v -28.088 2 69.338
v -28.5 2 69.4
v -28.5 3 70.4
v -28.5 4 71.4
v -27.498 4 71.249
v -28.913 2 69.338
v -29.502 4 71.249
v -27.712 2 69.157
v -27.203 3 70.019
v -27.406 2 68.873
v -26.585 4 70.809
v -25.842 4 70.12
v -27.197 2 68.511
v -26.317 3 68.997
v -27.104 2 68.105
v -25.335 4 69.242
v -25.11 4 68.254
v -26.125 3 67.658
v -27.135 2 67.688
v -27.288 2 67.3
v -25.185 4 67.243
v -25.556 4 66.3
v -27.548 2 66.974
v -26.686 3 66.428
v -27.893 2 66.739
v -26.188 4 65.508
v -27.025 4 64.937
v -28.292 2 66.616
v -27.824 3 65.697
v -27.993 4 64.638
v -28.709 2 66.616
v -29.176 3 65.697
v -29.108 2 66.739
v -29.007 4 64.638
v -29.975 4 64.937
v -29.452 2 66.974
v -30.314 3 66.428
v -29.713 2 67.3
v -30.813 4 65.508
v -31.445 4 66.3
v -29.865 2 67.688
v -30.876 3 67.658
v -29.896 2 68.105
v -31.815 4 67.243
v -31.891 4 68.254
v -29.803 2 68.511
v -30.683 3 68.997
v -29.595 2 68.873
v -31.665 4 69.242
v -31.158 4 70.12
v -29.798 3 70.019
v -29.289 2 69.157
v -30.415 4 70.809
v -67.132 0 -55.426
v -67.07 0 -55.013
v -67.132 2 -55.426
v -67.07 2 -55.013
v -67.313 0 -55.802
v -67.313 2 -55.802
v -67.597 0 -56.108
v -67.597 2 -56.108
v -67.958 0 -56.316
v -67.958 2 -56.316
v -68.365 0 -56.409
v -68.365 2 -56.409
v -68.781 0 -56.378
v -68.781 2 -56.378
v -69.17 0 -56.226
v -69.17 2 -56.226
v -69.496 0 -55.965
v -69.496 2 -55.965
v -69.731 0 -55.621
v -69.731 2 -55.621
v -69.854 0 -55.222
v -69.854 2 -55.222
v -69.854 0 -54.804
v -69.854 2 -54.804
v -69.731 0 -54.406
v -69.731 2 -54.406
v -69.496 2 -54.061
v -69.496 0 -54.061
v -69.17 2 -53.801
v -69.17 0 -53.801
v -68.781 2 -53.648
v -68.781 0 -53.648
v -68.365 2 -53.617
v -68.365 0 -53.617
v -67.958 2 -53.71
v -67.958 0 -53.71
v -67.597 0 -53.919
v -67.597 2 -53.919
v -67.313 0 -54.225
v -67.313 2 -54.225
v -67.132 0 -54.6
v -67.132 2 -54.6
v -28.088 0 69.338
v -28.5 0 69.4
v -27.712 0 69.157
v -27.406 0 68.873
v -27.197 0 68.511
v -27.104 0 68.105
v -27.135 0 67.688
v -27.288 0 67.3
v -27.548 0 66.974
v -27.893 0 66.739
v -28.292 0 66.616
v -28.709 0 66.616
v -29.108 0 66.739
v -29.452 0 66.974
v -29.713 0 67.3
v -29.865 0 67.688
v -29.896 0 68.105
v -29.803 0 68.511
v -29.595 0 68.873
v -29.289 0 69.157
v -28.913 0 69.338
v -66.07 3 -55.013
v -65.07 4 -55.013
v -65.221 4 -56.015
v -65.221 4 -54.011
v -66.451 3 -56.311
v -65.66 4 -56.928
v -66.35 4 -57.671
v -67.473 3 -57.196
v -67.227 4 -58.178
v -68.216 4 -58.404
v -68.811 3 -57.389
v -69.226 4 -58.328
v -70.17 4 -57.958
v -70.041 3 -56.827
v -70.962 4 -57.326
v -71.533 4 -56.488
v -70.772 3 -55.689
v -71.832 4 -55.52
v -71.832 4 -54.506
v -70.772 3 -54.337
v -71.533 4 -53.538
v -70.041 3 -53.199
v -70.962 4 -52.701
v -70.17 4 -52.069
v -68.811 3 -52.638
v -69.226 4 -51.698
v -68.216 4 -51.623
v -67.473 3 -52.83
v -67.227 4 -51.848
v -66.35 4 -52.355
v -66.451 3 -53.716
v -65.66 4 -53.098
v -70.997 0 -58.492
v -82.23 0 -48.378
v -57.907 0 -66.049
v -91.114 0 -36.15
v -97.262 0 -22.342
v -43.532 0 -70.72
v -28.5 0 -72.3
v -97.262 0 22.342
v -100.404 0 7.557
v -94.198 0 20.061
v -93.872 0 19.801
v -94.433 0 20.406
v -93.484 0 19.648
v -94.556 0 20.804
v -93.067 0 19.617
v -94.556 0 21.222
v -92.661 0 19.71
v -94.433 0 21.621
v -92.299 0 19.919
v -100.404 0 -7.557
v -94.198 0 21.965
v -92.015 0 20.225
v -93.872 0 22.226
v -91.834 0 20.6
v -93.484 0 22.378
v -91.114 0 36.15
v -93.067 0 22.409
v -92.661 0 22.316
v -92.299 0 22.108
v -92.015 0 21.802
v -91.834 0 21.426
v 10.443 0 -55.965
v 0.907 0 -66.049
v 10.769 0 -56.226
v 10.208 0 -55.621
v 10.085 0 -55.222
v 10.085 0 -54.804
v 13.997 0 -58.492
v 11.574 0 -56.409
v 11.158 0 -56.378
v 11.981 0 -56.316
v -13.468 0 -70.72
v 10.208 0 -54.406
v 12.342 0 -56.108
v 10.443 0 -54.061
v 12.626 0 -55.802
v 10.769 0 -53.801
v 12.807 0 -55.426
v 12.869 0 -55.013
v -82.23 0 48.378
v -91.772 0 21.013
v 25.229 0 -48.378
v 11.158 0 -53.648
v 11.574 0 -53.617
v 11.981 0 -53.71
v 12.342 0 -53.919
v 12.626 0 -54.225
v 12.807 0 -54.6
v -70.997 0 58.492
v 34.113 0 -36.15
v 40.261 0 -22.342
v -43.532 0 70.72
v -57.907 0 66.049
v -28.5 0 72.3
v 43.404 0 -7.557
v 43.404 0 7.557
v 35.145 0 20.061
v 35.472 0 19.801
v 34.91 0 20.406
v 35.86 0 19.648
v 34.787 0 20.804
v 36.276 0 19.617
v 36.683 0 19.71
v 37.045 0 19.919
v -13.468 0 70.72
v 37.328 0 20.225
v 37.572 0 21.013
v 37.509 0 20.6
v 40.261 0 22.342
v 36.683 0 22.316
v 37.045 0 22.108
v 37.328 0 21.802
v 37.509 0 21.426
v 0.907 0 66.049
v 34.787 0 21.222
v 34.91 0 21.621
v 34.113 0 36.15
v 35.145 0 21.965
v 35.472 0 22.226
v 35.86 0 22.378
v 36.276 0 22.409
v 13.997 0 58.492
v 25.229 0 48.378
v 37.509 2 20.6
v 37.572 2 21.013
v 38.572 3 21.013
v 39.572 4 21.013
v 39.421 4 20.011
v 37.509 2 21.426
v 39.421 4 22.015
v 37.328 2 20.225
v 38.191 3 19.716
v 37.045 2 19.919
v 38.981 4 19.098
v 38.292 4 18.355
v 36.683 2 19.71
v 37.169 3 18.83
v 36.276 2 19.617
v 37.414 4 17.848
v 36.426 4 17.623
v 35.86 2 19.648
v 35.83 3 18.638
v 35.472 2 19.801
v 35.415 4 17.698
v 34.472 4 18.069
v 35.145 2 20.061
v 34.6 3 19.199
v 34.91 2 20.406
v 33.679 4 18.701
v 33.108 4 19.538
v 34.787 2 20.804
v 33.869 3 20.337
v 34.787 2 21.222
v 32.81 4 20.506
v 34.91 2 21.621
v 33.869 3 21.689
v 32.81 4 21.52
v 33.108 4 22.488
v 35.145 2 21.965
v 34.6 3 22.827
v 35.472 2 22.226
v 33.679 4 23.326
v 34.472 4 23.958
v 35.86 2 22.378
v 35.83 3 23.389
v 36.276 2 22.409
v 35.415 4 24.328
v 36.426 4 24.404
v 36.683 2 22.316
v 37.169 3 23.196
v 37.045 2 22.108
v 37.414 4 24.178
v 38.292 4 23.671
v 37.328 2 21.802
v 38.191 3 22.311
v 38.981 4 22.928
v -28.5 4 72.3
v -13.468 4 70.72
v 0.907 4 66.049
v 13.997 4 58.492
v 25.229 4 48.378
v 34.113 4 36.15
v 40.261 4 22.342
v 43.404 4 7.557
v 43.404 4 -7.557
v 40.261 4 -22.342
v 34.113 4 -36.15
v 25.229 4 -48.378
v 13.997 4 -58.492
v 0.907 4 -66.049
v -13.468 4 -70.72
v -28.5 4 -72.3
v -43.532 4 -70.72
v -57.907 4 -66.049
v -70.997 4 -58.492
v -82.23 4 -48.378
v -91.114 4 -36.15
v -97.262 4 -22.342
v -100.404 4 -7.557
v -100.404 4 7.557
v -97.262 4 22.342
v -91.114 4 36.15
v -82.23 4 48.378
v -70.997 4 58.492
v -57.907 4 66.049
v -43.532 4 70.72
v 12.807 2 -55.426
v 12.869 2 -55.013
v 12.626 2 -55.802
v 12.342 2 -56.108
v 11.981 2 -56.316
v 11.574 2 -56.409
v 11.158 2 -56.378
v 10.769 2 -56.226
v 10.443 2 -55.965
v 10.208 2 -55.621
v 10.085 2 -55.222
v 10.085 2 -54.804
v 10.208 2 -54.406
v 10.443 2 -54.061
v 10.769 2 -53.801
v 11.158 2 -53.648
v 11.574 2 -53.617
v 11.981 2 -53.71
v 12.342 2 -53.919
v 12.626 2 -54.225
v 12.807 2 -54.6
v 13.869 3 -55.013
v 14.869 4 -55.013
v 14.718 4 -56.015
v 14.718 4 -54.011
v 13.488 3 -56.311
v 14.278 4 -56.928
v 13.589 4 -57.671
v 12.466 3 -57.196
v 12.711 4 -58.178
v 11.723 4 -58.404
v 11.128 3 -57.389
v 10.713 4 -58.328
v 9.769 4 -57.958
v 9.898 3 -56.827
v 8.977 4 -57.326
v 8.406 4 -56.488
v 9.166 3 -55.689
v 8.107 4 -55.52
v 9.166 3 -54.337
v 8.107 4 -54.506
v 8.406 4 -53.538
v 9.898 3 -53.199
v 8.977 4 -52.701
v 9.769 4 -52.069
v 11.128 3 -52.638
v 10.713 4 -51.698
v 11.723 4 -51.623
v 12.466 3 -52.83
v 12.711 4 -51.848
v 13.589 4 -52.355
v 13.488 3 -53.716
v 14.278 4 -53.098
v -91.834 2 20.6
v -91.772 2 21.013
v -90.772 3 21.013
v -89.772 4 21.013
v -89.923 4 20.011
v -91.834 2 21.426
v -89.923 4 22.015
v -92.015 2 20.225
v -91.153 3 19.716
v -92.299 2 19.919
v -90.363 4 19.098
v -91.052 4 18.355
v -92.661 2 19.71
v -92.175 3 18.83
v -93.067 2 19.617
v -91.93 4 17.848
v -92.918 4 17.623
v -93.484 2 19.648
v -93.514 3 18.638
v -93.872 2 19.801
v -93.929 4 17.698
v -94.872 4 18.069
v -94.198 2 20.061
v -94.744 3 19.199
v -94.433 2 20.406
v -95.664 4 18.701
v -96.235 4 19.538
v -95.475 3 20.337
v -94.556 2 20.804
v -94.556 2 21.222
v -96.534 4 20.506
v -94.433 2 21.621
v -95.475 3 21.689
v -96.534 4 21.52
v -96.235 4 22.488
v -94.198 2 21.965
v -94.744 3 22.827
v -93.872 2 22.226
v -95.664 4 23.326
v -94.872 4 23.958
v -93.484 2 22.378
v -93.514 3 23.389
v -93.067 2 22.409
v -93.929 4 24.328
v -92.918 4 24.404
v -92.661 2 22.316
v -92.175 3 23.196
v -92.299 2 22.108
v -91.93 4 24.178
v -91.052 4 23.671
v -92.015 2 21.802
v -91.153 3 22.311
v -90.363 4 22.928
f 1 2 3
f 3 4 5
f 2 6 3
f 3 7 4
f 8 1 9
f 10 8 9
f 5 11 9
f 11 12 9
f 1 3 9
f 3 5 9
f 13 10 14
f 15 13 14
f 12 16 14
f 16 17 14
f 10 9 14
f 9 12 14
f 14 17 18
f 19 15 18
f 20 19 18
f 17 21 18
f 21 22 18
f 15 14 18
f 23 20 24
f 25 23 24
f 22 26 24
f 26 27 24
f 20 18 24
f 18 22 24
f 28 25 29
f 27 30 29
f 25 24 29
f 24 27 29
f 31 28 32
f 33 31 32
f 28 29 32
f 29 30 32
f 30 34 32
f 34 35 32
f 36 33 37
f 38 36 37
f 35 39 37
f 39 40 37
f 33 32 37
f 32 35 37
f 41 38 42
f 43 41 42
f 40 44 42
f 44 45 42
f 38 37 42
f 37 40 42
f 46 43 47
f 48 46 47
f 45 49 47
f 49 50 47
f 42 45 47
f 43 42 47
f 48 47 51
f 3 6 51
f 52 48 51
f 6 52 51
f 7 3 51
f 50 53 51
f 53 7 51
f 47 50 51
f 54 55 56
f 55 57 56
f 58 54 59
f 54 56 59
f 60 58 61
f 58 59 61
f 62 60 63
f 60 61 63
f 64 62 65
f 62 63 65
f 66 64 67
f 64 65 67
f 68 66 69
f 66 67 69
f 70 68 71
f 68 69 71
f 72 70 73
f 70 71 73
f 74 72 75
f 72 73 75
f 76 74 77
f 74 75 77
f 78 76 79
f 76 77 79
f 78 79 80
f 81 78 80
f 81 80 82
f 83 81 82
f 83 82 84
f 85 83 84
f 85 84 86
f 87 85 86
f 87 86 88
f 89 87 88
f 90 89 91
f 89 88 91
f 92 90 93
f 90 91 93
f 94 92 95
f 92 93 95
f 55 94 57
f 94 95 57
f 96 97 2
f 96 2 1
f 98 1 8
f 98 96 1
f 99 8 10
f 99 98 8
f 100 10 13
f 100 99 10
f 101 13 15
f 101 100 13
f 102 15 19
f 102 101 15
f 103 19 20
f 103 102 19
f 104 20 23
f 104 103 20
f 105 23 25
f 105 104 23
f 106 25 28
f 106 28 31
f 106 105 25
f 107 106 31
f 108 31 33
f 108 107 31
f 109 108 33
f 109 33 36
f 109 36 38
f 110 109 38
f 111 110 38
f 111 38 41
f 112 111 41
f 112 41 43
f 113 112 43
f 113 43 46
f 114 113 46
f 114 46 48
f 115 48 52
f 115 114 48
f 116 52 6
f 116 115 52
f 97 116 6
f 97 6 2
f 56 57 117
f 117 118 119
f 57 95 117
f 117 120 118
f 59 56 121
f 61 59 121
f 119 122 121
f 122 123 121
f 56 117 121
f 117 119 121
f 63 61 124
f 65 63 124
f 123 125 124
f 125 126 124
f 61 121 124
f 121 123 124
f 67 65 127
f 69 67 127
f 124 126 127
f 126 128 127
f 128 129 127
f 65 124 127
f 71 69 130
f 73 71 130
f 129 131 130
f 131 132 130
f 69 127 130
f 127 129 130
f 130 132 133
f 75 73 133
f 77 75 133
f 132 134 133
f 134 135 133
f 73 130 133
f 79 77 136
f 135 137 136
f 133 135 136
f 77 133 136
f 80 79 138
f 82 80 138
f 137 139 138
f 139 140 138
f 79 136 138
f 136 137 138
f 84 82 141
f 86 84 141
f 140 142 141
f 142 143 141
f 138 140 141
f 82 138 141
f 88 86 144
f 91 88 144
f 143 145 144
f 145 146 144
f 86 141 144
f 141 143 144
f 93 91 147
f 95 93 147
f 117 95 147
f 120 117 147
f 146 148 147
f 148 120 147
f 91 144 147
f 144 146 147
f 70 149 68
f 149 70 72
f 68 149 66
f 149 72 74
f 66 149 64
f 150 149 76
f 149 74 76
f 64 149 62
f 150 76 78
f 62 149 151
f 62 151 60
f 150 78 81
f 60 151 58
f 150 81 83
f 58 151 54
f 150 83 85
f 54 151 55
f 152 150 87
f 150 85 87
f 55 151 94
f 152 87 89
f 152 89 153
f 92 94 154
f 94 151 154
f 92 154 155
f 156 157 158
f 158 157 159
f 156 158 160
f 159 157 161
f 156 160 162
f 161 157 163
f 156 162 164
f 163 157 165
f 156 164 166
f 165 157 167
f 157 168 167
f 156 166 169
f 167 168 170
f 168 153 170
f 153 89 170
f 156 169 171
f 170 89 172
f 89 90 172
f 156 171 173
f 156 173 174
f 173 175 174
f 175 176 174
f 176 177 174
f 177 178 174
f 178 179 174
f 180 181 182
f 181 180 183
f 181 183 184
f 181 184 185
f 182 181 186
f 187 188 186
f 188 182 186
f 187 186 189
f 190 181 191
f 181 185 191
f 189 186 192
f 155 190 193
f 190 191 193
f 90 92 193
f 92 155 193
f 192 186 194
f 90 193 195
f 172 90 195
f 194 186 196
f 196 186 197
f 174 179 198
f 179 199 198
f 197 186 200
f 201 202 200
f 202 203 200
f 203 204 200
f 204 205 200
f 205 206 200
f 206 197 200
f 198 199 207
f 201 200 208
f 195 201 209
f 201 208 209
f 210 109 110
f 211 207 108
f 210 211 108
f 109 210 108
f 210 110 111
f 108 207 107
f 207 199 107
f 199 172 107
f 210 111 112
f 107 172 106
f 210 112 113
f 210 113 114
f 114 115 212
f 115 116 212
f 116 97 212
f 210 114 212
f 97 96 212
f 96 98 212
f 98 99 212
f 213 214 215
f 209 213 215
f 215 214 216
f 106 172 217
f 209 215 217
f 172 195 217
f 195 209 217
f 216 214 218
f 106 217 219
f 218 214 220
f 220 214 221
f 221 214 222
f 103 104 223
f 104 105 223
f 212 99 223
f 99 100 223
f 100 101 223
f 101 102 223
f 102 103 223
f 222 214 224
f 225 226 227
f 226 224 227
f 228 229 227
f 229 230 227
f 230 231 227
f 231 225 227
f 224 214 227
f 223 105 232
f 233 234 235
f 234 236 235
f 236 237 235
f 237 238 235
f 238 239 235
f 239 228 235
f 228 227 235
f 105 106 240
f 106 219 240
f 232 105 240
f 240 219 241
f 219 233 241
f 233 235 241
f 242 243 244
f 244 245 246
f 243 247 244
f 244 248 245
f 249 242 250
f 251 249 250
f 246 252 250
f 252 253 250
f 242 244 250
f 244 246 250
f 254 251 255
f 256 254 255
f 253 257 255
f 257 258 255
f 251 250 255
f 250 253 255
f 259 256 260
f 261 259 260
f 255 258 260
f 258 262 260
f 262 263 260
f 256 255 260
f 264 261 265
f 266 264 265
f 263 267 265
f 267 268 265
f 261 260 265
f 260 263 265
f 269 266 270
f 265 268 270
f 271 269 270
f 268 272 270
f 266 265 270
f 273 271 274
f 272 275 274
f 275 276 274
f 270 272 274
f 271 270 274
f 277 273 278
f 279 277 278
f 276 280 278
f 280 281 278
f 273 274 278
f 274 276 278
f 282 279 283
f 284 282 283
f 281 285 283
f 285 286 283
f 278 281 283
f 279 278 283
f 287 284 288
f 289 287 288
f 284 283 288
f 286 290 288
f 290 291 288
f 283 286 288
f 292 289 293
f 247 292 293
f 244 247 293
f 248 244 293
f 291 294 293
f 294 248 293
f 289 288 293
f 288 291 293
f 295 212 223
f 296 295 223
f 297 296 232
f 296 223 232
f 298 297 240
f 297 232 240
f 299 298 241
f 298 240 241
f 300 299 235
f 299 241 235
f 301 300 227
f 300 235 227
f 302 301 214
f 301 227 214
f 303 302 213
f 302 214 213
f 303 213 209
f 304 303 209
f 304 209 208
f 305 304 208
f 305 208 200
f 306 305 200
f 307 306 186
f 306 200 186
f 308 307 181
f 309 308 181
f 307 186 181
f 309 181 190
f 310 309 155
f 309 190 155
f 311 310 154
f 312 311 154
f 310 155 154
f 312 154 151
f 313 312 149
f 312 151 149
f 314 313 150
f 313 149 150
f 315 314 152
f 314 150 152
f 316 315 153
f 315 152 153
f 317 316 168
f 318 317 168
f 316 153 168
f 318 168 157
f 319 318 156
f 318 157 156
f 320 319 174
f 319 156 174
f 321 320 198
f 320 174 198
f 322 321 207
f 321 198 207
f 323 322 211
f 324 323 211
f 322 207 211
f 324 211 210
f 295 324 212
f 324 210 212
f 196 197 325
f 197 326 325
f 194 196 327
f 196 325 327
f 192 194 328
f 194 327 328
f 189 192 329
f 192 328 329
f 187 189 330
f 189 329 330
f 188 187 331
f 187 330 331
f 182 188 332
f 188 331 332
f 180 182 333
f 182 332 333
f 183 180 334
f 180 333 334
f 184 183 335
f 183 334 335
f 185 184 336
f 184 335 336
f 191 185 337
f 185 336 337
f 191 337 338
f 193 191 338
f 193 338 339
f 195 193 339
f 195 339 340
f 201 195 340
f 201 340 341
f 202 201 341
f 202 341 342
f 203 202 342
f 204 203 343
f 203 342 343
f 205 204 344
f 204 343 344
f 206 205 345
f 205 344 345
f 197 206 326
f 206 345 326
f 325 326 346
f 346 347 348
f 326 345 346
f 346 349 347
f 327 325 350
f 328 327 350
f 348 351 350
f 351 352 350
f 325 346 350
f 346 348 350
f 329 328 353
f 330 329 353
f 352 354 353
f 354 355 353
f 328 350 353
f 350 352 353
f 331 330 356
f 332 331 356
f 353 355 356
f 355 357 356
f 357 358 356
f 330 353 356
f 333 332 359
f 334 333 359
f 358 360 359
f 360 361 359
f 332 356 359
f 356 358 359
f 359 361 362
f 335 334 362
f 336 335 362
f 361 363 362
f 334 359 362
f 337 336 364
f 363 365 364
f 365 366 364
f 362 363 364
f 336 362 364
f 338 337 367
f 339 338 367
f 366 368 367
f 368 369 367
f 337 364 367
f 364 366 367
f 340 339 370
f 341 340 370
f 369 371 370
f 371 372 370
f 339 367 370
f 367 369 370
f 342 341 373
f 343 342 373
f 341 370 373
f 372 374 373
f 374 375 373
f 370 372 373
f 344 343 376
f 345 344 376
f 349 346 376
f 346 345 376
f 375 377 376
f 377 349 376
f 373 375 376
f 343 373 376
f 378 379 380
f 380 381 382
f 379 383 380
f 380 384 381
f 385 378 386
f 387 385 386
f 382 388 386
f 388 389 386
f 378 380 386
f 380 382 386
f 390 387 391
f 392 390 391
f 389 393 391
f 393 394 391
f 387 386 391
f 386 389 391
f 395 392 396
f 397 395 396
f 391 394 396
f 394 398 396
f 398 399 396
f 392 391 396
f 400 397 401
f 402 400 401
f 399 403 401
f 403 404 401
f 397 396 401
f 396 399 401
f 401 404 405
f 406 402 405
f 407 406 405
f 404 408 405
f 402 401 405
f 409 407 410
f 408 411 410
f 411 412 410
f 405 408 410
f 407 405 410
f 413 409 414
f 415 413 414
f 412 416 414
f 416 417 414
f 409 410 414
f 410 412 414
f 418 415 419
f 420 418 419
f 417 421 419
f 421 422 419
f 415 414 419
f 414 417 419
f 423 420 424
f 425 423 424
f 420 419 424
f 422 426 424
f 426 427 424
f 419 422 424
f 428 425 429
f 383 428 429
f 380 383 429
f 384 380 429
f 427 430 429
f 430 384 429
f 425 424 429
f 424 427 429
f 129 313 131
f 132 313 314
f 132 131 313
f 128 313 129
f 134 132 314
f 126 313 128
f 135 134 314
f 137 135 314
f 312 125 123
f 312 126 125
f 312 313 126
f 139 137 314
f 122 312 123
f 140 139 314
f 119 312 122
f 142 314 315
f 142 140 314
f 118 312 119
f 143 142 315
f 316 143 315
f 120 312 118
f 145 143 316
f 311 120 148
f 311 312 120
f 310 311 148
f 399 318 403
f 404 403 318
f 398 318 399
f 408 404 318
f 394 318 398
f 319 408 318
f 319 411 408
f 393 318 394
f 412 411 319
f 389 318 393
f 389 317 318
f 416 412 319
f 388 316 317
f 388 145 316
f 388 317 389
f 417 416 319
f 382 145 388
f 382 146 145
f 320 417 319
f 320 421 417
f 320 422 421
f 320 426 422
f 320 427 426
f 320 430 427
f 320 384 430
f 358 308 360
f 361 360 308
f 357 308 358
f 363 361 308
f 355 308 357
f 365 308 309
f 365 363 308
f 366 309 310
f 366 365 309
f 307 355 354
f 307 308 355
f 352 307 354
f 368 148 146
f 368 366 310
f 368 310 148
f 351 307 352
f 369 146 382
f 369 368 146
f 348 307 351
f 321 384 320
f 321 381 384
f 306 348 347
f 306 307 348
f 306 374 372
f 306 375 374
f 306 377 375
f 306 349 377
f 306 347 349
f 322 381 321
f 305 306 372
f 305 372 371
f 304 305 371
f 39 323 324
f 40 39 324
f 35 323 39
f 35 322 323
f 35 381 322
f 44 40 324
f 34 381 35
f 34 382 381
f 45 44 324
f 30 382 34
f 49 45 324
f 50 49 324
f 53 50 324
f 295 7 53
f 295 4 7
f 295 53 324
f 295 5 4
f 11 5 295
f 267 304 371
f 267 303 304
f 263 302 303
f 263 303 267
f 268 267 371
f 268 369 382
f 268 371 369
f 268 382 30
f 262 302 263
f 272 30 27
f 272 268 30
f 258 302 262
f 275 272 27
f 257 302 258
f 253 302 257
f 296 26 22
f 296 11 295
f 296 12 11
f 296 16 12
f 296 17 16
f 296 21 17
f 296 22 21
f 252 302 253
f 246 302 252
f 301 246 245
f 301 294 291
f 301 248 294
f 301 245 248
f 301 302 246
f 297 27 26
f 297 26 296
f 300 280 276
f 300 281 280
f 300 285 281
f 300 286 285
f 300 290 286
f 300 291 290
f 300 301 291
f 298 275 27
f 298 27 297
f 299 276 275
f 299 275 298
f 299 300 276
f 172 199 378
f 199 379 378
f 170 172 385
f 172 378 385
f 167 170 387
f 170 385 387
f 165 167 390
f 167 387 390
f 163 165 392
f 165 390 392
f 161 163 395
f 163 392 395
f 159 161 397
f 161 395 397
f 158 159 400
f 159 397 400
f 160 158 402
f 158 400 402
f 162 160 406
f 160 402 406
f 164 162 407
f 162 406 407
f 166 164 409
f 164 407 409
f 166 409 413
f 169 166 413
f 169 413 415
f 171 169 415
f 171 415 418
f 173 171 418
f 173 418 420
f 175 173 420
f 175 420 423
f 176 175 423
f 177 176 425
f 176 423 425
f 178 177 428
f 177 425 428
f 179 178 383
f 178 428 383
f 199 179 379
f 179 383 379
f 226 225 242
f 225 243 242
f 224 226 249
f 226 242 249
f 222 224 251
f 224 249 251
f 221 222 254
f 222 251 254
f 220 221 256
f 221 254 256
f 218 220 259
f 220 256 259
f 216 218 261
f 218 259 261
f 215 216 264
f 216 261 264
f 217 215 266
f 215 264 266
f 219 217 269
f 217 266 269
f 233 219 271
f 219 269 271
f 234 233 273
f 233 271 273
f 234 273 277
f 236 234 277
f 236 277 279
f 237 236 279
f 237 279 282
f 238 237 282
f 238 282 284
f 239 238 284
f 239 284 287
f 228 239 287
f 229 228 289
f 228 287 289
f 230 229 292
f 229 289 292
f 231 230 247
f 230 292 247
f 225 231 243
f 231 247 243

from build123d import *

# Parameters (mm, degrees)
SKETCH1_R           = 72.3
SKETCH1_R_2         = 1.4
BOSS_EXTRUDE1_DEPTH = 4
CHAMFER1_SIZE       = 2


# Read off the part's stored shape, not the designer's step: CirPattern4
with BuildPart() as part:
    # Sketch1 → Boss-Extrude1 (new body)
    with BuildSketch(Plane(origin=(0, 0, 0), x_dir=(-1, 0, 0), z_dir=(0, 1, 0))):
        with Locations(Location((28.500199727, 0, 0), (0, 0, 90))):
            Circle(SKETCH1_R)
        with Locations(Location((28.500199727, 68, 0), (0, 0, 90))):
            Circle(SKETCH1_R_2, mode=Mode.SUBTRACT)
    extrude(amount=BOSS_EXTRUDE1_DEPTH)

    # Chamfer1
    chamfer1_edges = [part.edges().sort_by_distance(p)[0] for p in [
        (-28.500199727, 4, 66.6),
    ]]
    chamfer(chamfer1_edges, length=CHAMFER1_SIZE)

    # CirPattern4 outline → CirPattern4 (revolve, cut)
    with BuildSketch(Plane(origin=(-93.172042835, 0, 21.013155617), x_dir=(1, 0, 0), z_dir=(0, 0, 1))):
        Polygon((3.4, 4), (0, 4), (0, 0), (1.4, 0), (1.4, 2), align=None)
    revolve(axis=Axis((-93.172042835, 0, 21.013155617), (0, 1, 0)), mode=Mode.SUBTRACT)

    # CirPattern4 2 outline → CirPattern4 2 (revolve, cut)
    with BuildSketch(Plane(origin=(-68.469596883, 0, -55.013155617), x_dir=(1, 0, 0), z_dir=(0, 0, 1))):
        Polygon((3.4, 4), (0, 4), (0, 0), (1.4, 0), (1.4, 2), align=None)
    revolve(axis=Axis((-68.469596883, 0, -55.013155617), (0, 1, 0)), mode=Mode.SUBTRACT)

    # CirPattern4 3 outline → CirPattern4 3 (revolve, cut)
    with BuildSketch(Plane(origin=(11.469197429, 0, -55.013155617), x_dir=(1, 0, 0), z_dir=(0, 0, 1))):
        Polygon((3.4, 4), (0, 4), (0, 0), (1.4, 0), (1.4, 2), align=None)
    revolve(axis=Axis((11.469197429, 0, -55.013155617), (0, 1, 0)), mode=Mode.SUBTRACT)

    # CirPattern4 4 outline → CirPattern4 4 (revolve, cut)
    with BuildSketch(Plane(origin=(36.171643381, 0, 21.013155617), x_dir=(1, 0, 0), z_dir=(0, 0, 1))):
        Polygon((3.4, 4), (0, 4), (0, 0), (1.4, 0), (1.4, 2), align=None)
    revolve(axis=Axis((36.171643381, 0, 21.013155617), (0, 1, 0)), mode=Mode.SUBTRACT)


solid = part.part
